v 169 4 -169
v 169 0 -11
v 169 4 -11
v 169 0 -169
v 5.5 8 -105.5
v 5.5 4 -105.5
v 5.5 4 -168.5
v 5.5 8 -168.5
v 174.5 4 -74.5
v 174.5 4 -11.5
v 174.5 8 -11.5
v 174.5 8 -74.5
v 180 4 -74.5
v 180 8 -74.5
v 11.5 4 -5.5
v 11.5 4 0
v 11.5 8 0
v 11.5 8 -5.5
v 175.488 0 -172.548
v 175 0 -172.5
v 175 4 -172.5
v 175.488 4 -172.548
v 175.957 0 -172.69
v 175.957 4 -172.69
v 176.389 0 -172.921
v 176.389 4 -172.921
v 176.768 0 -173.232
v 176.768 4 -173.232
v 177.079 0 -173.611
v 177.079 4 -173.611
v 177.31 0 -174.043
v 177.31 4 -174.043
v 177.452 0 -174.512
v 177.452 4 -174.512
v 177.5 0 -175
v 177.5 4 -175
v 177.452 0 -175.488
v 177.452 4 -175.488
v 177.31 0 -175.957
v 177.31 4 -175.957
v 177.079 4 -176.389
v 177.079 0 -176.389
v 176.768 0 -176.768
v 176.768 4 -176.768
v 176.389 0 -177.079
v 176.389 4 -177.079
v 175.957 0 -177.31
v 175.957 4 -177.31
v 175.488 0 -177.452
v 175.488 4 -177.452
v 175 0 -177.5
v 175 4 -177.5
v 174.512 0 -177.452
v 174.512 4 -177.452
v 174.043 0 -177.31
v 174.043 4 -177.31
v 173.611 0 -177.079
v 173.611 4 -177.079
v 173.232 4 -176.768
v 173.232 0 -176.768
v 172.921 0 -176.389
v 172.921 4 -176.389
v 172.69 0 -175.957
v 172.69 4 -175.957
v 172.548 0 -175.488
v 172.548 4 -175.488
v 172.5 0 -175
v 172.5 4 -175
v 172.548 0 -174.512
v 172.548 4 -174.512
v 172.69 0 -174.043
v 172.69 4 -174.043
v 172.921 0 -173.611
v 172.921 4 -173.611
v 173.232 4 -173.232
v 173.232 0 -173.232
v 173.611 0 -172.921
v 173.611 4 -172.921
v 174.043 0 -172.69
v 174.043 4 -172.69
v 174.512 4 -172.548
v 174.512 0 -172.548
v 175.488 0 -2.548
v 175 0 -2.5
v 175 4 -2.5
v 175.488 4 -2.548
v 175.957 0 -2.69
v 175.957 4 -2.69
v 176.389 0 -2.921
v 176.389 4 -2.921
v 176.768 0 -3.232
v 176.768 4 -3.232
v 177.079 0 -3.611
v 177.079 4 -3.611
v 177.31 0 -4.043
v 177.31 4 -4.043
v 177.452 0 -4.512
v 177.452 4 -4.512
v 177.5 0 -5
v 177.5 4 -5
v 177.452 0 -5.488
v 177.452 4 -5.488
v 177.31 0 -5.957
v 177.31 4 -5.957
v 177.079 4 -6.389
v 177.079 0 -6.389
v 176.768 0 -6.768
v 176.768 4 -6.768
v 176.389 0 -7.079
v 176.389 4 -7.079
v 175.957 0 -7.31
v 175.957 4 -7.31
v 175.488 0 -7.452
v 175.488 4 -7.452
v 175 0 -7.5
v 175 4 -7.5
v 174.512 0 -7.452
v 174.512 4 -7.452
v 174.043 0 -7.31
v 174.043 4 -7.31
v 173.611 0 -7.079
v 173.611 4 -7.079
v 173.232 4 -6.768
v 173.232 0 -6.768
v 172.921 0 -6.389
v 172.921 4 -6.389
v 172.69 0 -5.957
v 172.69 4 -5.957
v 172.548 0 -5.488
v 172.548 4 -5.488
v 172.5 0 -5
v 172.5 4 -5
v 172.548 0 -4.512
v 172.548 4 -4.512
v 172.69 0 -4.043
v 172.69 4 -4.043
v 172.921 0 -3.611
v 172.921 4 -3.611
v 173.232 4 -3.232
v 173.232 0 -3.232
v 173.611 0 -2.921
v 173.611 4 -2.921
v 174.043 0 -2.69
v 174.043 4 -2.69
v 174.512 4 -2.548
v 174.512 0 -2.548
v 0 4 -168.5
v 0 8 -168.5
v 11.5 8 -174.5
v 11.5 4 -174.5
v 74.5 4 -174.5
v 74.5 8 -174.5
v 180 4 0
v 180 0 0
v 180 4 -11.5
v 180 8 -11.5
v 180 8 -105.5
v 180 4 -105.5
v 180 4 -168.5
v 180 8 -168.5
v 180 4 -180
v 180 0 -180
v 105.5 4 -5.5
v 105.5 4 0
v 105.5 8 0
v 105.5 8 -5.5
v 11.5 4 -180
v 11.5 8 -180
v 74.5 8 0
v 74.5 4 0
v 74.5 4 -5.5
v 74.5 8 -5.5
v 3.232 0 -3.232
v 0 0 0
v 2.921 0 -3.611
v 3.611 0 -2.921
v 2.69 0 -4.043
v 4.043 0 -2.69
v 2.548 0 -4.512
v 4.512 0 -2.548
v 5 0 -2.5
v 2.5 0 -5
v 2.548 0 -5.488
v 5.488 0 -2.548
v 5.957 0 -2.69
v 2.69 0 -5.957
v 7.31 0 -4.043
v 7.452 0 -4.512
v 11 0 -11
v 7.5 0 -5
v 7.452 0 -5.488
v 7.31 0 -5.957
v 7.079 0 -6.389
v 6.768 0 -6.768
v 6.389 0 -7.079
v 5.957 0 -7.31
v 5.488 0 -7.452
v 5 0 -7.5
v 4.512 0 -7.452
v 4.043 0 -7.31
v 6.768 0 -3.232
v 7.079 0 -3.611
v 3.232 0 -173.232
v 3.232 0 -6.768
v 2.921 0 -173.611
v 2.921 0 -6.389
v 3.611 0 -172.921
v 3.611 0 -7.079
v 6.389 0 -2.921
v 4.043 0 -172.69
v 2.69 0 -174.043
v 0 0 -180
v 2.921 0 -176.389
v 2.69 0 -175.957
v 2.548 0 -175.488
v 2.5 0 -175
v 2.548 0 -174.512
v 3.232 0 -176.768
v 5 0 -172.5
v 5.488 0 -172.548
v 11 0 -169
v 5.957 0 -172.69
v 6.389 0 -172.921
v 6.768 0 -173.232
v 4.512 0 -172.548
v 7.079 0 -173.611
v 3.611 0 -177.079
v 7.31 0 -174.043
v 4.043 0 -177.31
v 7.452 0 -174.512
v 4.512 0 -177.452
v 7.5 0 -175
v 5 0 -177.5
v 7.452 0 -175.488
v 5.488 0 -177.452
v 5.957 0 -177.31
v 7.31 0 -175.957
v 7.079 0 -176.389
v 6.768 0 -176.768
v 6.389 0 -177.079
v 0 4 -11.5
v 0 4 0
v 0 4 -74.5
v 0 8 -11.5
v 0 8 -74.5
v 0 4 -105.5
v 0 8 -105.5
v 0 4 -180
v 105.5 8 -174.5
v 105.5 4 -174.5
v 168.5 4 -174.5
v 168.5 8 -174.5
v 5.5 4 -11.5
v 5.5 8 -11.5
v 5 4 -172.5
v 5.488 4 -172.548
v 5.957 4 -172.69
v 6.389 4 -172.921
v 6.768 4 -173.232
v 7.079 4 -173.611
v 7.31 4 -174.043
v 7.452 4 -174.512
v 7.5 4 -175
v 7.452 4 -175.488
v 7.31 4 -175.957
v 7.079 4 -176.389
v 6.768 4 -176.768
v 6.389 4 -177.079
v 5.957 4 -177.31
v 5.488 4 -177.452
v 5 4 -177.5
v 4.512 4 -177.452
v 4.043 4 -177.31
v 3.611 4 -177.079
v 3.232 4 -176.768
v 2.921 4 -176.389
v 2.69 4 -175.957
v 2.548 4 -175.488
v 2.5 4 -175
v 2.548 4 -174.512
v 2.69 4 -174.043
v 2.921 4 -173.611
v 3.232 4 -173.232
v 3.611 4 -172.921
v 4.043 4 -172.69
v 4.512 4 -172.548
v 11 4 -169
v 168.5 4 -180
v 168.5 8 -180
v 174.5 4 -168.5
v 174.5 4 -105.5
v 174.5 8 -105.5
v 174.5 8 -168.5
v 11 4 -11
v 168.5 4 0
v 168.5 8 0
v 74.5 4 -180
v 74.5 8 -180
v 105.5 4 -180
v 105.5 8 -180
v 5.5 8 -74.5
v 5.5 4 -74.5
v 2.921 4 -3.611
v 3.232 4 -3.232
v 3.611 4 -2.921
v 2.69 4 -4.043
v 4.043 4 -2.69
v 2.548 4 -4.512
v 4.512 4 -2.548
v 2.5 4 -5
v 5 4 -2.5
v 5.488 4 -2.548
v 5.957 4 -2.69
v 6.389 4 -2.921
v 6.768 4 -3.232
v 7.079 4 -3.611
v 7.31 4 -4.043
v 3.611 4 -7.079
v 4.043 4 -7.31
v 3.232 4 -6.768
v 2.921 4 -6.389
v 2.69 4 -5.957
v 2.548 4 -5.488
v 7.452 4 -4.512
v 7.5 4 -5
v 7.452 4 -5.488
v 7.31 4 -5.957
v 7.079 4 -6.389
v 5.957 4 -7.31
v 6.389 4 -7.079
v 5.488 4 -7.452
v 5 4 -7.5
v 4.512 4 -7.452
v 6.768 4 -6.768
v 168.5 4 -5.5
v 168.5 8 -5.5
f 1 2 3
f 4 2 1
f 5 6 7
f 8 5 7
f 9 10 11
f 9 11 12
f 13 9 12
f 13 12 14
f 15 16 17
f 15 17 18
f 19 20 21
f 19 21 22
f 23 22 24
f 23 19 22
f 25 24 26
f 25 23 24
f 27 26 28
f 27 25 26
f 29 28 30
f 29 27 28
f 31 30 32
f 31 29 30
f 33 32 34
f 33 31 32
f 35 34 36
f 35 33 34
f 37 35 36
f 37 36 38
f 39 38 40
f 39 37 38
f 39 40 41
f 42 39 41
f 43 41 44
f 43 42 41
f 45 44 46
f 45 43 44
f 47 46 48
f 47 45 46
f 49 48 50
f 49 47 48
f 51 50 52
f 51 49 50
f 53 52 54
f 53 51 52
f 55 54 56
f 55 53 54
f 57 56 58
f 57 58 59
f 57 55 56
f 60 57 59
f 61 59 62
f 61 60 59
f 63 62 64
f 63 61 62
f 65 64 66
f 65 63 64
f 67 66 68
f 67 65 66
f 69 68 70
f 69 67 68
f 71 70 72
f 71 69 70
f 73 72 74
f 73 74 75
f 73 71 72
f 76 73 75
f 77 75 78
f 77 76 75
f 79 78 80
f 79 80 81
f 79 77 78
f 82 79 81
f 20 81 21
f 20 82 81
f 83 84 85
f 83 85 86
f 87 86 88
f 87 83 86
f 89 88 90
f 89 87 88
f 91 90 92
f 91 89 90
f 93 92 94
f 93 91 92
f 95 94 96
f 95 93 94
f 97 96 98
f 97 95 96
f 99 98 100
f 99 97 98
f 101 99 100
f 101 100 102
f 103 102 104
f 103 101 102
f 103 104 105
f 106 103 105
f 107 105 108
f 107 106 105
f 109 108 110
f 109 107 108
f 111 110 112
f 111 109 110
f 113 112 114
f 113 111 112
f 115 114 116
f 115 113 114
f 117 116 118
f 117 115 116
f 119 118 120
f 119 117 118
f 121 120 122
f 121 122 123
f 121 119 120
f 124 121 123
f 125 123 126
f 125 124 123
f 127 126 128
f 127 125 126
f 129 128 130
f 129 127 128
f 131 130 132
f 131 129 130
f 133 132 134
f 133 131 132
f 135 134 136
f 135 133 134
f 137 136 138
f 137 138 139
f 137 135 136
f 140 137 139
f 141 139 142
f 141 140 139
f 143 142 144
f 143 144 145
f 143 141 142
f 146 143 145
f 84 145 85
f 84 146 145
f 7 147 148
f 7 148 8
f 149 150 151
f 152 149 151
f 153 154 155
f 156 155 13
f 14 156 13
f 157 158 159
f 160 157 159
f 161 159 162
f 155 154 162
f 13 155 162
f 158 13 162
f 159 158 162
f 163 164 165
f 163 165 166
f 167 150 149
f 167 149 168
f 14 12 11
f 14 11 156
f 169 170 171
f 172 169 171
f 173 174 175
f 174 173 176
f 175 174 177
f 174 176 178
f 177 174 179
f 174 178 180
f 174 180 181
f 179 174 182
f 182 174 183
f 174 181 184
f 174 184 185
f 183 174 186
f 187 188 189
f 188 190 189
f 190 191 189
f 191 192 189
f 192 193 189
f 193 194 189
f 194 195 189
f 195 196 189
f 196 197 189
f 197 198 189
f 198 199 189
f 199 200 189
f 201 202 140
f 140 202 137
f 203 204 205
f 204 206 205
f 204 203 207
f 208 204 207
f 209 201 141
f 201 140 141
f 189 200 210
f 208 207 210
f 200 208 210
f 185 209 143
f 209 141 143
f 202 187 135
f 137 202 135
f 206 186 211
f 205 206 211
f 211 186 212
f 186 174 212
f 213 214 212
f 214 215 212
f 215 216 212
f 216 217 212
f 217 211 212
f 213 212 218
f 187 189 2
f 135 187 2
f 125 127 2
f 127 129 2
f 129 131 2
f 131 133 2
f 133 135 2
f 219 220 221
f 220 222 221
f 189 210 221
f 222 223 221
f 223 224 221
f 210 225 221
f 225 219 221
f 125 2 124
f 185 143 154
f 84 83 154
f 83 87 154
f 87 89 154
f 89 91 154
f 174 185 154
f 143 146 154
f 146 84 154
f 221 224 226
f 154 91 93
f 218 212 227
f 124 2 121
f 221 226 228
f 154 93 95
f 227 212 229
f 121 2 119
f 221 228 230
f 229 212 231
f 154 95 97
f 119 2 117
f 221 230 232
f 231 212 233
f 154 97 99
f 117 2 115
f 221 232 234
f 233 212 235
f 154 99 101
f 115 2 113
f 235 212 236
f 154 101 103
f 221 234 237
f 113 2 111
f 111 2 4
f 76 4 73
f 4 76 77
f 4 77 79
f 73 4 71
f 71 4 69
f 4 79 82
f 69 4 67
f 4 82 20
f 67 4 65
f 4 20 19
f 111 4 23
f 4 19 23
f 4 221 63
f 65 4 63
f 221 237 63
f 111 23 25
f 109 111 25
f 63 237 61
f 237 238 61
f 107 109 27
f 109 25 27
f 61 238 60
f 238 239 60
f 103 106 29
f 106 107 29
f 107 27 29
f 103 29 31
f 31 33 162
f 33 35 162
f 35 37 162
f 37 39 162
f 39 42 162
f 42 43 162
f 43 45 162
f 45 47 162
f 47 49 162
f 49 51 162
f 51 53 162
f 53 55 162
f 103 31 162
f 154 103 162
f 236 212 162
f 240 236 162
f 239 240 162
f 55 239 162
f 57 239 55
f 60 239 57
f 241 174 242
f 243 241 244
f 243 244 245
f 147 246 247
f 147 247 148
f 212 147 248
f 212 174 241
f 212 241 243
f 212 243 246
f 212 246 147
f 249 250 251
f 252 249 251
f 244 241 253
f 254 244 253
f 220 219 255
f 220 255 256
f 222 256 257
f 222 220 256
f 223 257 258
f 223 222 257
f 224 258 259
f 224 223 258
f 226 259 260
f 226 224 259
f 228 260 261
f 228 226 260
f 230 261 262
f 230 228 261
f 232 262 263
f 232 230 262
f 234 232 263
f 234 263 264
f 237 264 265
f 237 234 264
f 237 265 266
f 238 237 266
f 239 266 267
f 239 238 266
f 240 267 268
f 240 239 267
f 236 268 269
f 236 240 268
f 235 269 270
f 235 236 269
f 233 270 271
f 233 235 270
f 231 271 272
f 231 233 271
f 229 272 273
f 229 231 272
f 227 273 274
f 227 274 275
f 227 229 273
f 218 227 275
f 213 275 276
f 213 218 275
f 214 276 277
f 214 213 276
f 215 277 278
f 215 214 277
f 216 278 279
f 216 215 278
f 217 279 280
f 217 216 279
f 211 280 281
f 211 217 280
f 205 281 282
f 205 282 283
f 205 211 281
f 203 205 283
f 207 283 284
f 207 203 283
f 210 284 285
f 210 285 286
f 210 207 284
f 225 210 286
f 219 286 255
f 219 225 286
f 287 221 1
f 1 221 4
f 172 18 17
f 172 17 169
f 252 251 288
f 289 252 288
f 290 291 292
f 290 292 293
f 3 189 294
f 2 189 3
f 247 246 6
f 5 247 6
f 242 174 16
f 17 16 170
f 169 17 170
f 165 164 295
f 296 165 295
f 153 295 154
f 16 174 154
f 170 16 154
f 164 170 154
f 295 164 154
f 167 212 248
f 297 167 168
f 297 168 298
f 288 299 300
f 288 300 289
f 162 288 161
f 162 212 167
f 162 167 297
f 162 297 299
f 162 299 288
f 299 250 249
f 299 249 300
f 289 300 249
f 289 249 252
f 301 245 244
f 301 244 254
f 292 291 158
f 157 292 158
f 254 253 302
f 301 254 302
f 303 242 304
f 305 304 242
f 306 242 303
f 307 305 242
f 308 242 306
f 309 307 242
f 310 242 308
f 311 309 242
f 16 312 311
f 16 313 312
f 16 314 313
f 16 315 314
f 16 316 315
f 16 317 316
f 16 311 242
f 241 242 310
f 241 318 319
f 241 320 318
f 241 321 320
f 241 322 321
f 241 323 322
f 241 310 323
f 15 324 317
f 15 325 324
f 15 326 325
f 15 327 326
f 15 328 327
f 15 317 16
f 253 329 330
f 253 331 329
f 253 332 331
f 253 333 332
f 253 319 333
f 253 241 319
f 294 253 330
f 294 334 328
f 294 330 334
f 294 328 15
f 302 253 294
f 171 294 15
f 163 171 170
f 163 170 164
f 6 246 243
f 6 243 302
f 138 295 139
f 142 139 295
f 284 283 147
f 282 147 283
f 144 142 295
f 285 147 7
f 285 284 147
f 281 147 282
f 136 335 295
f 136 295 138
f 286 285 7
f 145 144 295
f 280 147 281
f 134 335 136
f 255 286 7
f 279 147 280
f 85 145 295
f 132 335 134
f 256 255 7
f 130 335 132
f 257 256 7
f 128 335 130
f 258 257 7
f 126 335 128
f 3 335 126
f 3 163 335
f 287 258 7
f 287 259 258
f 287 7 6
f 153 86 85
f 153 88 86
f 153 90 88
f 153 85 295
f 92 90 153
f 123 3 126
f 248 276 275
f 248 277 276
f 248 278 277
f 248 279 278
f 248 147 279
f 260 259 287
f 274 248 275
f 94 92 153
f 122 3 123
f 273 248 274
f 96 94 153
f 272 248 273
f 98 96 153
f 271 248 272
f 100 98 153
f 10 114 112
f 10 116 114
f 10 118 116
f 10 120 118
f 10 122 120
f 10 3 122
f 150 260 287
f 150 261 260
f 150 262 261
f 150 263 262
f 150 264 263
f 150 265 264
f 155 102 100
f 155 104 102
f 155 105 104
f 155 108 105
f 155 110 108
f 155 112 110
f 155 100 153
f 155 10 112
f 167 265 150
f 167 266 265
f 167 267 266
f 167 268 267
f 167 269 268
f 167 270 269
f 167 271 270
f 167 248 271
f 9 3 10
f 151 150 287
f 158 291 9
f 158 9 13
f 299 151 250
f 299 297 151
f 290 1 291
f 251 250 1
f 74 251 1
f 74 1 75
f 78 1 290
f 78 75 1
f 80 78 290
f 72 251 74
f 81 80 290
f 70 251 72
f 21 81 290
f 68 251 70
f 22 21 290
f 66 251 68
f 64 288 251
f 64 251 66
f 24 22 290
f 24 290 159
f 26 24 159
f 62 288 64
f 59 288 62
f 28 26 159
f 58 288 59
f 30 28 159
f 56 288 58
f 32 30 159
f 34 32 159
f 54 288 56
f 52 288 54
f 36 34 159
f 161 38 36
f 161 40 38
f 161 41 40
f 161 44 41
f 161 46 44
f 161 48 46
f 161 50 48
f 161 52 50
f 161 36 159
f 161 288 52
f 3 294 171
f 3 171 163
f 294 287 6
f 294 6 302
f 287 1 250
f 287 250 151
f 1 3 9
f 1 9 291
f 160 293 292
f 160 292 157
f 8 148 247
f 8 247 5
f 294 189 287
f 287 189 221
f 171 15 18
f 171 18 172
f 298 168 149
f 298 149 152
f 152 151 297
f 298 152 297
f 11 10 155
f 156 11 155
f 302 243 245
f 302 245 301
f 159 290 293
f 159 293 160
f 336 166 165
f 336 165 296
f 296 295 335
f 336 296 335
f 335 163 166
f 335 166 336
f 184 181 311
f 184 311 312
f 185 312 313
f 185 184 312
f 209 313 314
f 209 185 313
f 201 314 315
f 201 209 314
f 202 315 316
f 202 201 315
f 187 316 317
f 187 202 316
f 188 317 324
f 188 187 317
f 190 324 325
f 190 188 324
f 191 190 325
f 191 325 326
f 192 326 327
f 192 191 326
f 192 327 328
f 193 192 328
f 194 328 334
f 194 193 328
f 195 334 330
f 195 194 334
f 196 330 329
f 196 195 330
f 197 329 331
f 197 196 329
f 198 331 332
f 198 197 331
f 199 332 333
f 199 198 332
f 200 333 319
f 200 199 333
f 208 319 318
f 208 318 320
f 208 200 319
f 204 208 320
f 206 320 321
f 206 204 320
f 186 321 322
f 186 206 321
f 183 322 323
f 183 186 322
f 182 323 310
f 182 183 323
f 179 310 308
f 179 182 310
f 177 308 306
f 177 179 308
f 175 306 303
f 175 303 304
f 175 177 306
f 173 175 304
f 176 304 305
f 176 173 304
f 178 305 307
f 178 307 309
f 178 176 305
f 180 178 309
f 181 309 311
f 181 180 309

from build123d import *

# Parameters (mm, degrees)
CROQUIS1_W              = 180
CROQUIS1_H              = 180
CROQUIS1_R              = 2.5
CROQUIS1_W_2            = 158
CROQUIS1_H_2            = 158
SALIENTE_EXTRUIR1_DEPTH = 4
CROQUIS2_W              = 5.5
CROQUIS2_H              = 63
CROQUIS2_W_2            = 63
CROQUIS2_H_2            = 5.5
SALIENTE_EXTRUIR2_DEPTH = 4


with BuildPart() as part:
    # Croquis1 → Saliente-Extruir1 (new body)
    with BuildSketch(Plane(origin=(0, 0, 0), x_dir=(1, 0, 0), z_dir=(0, 1, 0))):
        with Locations((90, 90)):
            Rectangle(CROQUIS1_W, CROQUIS1_H)
        with Locations(Location((5, 175, 0), (0, 0, 270))):
            Circle(CROQUIS1_R, mode=Mode.SUBTRACT)
        with Locations(Location((175, 175, 0), (0, 0, 270))):
            Circle(CROQUIS1_R, mode=Mode.SUBTRACT)
        with Locations(Location((175, 5, 0), (0, 0, 270))):
            Circle(CROQUIS1_R, mode=Mode.SUBTRACT)
        with Locations(Location((5, 5, 0), (0, 0, 270))):
            Circle(CROQUIS1_R, mode=Mode.SUBTRACT)
        with Locations((90, 90)):
            Rectangle(CROQUIS1_W_2, CROQUIS1_H_2, mode=Mode.SUBTRACT)
    extrude(amount=SALIENTE_EXTRUIR1_DEPTH)

    # Croquis2 → Saliente-Extruir2 (add)
    with BuildSketch(Plane(origin=(0, 4, 0), x_dir=(1, 0, 0), z_dir=(0, 1, 0))):
        with Locations((2.75, 137)):
            Rectangle(CROQUIS2_W, CROQUIS2_H)
        with Locations((43, 177.25)):
            Rectangle(CROQUIS2_W_2, CROQUIS2_H_2)
        with Locations((137, 177.25)):
            Rectangle(CROQUIS2_W_2, CROQUIS2_H_2)
        with Locations((177.25, 137)):
            Rectangle(CROQUIS2_W, CROQUIS2_H)
        with Locations((177.25, 43)):
            Rectangle(CROQUIS2_W, CROQUIS2_H)
        with Locations((137, 2.75)):
            Rectangle(CROQUIS2_W_2, CROQUIS2_H_2)
        with Locations((43, 2.75)):
            Rectangle(CROQUIS2_W_2, CROQUIS2_H_2)
        with Locations((2.75, 43)):
            Rectangle(CROQUIS2_W, CROQUIS2_H)
    extrude(amount=SALIENTE_EXTRUIR2_DEPTH)


solid = part.part
